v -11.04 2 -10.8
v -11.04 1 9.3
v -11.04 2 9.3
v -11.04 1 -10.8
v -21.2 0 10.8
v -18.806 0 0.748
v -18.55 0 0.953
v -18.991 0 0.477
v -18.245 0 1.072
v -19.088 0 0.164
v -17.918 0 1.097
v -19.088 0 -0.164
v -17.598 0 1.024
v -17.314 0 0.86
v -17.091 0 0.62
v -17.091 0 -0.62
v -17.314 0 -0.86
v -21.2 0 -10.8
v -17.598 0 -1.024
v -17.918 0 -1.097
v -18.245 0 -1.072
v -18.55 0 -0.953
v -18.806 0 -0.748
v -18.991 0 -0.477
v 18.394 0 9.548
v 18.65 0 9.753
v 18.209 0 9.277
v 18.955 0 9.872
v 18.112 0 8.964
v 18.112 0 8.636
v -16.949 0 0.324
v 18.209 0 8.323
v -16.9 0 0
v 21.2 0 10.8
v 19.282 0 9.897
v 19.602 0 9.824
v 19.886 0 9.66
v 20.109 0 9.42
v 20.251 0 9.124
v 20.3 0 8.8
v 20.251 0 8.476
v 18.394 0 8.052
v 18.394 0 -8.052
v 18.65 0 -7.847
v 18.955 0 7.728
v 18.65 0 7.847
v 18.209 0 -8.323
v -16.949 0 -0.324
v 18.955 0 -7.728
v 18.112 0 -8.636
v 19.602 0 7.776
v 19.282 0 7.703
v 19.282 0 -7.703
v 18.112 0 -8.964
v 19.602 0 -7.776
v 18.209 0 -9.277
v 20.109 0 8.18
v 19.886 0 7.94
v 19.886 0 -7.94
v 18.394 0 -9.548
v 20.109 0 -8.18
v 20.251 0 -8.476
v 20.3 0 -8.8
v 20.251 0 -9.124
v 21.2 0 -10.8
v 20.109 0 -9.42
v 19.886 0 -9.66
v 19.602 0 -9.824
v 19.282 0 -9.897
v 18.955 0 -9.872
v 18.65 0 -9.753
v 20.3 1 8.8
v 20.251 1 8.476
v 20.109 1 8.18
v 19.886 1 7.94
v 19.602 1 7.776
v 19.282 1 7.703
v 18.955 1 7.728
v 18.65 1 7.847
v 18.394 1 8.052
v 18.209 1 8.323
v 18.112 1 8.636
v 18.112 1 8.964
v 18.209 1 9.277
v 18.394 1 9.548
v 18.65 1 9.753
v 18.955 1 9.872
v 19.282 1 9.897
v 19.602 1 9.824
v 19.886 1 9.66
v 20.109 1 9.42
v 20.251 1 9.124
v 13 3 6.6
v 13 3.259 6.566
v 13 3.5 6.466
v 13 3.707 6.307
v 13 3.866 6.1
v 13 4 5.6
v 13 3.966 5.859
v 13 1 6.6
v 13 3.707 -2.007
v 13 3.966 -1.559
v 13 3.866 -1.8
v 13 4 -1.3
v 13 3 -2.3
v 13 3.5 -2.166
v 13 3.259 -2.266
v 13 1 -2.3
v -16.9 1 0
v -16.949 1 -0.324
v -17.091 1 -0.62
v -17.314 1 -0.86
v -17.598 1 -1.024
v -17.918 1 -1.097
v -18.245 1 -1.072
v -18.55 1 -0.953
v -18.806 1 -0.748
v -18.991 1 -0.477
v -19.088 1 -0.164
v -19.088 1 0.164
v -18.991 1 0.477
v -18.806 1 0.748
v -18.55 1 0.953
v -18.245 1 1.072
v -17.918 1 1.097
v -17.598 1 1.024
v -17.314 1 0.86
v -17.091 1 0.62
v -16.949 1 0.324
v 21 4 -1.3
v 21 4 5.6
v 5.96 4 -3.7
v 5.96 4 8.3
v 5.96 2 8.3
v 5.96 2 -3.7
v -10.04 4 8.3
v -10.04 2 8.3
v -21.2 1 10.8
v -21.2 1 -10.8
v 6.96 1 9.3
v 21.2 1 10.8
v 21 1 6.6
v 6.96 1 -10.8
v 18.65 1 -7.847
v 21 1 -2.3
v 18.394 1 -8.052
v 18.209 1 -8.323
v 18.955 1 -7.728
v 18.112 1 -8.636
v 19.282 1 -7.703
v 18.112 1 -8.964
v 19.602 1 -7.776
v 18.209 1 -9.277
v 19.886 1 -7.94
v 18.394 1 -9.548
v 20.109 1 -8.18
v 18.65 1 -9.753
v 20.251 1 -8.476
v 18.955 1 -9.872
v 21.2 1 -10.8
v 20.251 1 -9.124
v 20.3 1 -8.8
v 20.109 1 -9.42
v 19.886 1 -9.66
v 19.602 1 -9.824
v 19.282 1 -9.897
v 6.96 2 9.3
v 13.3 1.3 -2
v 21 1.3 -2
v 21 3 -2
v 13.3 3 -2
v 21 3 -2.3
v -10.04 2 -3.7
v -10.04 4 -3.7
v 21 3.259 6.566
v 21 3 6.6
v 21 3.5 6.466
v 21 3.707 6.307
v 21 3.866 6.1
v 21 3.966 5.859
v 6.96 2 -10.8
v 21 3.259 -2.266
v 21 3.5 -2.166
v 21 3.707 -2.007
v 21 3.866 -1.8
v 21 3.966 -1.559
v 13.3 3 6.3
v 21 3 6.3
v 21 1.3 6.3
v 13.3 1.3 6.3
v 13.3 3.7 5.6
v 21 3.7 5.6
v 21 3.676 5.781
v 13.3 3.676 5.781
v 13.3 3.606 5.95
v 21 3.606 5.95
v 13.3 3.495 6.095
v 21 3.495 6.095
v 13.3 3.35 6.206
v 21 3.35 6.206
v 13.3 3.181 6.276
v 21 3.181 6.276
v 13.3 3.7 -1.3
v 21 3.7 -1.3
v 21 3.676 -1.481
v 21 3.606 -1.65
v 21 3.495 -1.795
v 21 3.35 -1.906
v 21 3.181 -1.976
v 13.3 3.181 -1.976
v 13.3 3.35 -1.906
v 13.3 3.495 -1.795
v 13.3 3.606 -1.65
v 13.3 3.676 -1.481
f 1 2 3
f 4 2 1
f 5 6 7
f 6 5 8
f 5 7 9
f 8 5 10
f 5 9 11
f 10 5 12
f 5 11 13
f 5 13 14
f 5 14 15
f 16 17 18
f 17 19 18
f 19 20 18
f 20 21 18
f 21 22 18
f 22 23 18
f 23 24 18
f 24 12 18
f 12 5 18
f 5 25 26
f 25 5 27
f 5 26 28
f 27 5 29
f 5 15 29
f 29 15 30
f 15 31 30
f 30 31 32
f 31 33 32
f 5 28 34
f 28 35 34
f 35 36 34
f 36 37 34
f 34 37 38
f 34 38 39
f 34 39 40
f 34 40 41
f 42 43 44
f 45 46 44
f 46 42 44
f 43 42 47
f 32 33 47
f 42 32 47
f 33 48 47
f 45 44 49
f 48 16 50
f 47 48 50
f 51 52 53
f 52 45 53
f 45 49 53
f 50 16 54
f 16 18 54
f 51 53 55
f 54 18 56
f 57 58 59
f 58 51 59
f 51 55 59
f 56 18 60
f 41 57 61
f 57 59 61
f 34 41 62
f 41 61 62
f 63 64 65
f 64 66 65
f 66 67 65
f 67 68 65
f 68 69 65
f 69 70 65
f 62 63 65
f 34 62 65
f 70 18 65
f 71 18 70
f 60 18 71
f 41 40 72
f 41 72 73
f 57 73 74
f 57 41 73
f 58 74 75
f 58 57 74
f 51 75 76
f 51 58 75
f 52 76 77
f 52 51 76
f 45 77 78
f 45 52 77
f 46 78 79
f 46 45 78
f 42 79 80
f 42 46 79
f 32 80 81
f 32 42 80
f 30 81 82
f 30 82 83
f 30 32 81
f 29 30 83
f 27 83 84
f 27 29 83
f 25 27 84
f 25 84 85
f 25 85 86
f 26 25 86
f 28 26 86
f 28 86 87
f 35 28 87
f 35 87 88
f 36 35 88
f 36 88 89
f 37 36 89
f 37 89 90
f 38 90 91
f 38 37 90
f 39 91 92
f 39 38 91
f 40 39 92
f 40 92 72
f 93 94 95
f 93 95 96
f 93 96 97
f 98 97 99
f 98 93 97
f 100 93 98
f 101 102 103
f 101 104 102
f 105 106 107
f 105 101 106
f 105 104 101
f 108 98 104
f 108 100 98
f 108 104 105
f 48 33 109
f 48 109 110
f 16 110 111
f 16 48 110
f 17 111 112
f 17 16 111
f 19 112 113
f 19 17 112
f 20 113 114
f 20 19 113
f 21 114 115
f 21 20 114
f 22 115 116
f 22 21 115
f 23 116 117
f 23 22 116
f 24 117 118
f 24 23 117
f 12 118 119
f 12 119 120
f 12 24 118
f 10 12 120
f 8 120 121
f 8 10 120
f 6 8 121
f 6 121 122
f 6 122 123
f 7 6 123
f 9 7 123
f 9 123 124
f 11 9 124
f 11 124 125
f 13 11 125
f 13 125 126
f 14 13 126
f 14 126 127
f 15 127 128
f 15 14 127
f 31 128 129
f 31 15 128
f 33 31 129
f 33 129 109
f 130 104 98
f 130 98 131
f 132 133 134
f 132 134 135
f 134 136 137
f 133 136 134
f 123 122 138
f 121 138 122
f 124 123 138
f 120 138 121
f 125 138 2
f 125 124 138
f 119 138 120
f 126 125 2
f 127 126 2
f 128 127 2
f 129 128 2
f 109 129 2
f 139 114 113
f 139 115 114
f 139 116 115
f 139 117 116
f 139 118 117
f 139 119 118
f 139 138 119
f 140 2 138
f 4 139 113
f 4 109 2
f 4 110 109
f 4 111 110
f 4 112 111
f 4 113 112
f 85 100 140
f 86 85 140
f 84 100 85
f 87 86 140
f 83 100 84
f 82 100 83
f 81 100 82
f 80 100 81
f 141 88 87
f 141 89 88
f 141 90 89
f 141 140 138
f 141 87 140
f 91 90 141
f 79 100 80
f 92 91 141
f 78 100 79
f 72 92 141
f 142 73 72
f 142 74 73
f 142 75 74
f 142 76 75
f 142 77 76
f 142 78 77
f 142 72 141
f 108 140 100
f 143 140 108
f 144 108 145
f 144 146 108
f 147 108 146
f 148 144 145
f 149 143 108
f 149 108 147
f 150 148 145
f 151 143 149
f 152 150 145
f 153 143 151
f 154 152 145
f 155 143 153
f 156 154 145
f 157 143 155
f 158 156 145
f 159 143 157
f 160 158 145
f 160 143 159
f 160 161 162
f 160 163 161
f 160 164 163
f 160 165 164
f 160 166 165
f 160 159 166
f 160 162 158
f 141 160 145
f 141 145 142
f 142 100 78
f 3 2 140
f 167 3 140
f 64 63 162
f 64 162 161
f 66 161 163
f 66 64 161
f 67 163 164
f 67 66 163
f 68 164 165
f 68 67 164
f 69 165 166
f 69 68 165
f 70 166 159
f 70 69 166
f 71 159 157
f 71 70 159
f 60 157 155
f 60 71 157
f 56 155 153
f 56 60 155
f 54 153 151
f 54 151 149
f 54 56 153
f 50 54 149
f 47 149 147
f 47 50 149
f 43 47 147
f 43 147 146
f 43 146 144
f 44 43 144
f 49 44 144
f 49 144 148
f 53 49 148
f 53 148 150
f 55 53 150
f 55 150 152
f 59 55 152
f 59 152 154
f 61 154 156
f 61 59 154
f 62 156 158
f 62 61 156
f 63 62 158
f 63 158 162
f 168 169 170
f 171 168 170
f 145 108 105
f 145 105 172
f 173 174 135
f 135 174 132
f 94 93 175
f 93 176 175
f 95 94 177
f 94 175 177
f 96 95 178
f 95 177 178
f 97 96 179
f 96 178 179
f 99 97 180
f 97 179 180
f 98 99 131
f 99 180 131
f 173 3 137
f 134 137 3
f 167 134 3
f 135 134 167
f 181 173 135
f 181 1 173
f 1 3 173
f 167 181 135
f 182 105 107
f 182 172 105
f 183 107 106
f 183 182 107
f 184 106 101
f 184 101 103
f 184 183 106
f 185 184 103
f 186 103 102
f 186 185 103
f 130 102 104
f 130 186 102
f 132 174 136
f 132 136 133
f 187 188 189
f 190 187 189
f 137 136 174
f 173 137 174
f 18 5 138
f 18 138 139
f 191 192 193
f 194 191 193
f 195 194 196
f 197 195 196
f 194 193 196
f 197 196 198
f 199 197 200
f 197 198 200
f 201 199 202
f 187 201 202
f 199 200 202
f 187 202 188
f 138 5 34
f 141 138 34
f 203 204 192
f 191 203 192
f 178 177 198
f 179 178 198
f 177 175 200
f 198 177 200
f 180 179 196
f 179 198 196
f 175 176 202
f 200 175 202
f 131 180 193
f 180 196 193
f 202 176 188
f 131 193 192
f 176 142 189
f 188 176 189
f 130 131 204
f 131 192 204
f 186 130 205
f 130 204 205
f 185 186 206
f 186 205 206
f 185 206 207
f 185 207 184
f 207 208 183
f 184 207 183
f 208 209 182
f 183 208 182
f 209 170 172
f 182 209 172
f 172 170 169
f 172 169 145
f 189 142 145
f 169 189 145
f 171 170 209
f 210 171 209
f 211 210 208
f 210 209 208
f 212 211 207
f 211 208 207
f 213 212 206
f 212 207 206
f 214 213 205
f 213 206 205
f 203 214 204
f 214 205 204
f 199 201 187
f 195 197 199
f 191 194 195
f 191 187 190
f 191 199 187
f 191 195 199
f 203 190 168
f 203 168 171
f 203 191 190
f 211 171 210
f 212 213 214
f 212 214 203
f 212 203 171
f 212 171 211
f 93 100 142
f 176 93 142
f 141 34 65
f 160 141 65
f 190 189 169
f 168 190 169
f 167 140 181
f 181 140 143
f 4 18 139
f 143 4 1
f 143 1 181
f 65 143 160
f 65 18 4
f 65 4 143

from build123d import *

# Parameters (mm, degrees)
SKETCH_1_W            = 42.4
SKETCH_1_H            = 21.6
SKETCH_1_R            = 1.1
EXTRUDE_1_DEPTH       = 1
SKETCH_2_W            = 18
SKETCH_2_H            = 14
SKETCH_2_W_2          = 8
SKETCH_2_H_2          = 8.9
EXTRUDE_2_DEPTH       = 3
FILLET_1_R            = 1
SKETCH_2_3_W          = 18
SKETCH_2_3_H          = 6.1
EXTRUDE_3_DEPTH       = 1
CUT_EXTRUDE_1_DEPTH   = 7.7
SKETCH_4_W            = 18
SKETCH_4_H            = 14
SKETCH_4_W_2          = 16
SKETCH_4_H_2          = 12
CUT_EXTRUDE_1_2_DEPTH = 2


with BuildPart() as part:
    # 草图1 → 凸台-拉伸1 (new body)
    with BuildSketch(Plane(origin=(0, 0, 0), x_dir=(1, 0, 0), z_dir=(0, 1, 0))):
        Rectangle(SKETCH_1_W, SKETCH_1_H)
        with Locations((-18, 0)):
            Circle(SKETCH_1_R, mode=Mode.SUBTRACT)
        with Locations((19.2, 8.8)):
            Circle(SKETCH_1_R, mode=Mode.SUBTRACT)
        with Locations((19.2, -8.8)):
            Circle(SKETCH_1_R, mode=Mode.SUBTRACT)
    extrude(amount=EXTRUDE_1_DEPTH)

    # 草图2 → 凸台-拉伸2 (add)
    with BuildSketch(Plane(origin=(0, 1, 0), x_dir=(1, 0, 0), z_dir=(0, 1, 0))):
        with Locations((-2.04, -2.3)):
            Rectangle(SKETCH_2_W, SKETCH_2_H)
        with Locations((17, -2.15)):
            Rectangle(SKETCH_2_W_2, SKETCH_2_H_2)
    extrude(amount=EXTRUDE_2_DEPTH)

    # 圆角1
    fillet_1_edges = [part.edges().sort_by_distance(p)[0] for p in [
        (17, 4, -2.3),
        (17, 4, 6.6),
    ]]
    fillet(fillet_1_edges, radius=FILLET_1_R)

    # 草图2<3> → 凸台-拉伸3 (add)
    with BuildSketch(Plane(origin=(0, 1, 0), x_dir=(1, 0, 0), z_dir=(0, 1, 0))):
        with Locations((-2.04, 7.75)):
            Rectangle(SKETCH_2_3_W, SKETCH_2_3_H)
    extrude(amount=EXTRUDE_3_DEPTH)

    # 草图3 → Cut-Extrude 1 (cut)
    with BuildSketch(Plane(origin=(21, 0, 0), x_dir=(0, 0, -1), z_dir=(1, 0, 0))):
        with BuildLine():
            Line((1.3, 3.7), (-5.6, 3.7))
            ThreePointArc((-5.6, 3.7), (-6.094974747, 3.494974747), (-6.3, 3))
            Line((-6.3, 3), (-6.3, 1.3))
            Line((-6.3, 1.3), (2, 1.3))
            Line((2, 1.3), (2, 3))
            ThreePointArc((2, 3), (1.794974747, 3.494974747), (1.3, 3.7))
        make_face()
    extrude(amount=-CUT_EXTRUDE_1_DEPTH, mode=Mode.SUBTRACT)

    # 草图4 → Cut-Extrude 1 2 (cut)
    with BuildSketch(Plane(origin=(0, 4, 0), x_dir=(1, 0, 0), z_dir=(0, 1, 0))):
        with Locations((-2.04, -2.3)):
            Rectangle(SKETCH_4_W, SKETCH_4_H)
        with Locations((-2.04, -2.3)):
            Rectangle(SKETCH_4_W_2, SKETCH_4_H_2, mode=Mode.SUBTRACT)
    extrude(amount=-CUT_EXTRUDE_1_2_DEPTH, mode=Mode.SUBTRACT)


solid = part.part
